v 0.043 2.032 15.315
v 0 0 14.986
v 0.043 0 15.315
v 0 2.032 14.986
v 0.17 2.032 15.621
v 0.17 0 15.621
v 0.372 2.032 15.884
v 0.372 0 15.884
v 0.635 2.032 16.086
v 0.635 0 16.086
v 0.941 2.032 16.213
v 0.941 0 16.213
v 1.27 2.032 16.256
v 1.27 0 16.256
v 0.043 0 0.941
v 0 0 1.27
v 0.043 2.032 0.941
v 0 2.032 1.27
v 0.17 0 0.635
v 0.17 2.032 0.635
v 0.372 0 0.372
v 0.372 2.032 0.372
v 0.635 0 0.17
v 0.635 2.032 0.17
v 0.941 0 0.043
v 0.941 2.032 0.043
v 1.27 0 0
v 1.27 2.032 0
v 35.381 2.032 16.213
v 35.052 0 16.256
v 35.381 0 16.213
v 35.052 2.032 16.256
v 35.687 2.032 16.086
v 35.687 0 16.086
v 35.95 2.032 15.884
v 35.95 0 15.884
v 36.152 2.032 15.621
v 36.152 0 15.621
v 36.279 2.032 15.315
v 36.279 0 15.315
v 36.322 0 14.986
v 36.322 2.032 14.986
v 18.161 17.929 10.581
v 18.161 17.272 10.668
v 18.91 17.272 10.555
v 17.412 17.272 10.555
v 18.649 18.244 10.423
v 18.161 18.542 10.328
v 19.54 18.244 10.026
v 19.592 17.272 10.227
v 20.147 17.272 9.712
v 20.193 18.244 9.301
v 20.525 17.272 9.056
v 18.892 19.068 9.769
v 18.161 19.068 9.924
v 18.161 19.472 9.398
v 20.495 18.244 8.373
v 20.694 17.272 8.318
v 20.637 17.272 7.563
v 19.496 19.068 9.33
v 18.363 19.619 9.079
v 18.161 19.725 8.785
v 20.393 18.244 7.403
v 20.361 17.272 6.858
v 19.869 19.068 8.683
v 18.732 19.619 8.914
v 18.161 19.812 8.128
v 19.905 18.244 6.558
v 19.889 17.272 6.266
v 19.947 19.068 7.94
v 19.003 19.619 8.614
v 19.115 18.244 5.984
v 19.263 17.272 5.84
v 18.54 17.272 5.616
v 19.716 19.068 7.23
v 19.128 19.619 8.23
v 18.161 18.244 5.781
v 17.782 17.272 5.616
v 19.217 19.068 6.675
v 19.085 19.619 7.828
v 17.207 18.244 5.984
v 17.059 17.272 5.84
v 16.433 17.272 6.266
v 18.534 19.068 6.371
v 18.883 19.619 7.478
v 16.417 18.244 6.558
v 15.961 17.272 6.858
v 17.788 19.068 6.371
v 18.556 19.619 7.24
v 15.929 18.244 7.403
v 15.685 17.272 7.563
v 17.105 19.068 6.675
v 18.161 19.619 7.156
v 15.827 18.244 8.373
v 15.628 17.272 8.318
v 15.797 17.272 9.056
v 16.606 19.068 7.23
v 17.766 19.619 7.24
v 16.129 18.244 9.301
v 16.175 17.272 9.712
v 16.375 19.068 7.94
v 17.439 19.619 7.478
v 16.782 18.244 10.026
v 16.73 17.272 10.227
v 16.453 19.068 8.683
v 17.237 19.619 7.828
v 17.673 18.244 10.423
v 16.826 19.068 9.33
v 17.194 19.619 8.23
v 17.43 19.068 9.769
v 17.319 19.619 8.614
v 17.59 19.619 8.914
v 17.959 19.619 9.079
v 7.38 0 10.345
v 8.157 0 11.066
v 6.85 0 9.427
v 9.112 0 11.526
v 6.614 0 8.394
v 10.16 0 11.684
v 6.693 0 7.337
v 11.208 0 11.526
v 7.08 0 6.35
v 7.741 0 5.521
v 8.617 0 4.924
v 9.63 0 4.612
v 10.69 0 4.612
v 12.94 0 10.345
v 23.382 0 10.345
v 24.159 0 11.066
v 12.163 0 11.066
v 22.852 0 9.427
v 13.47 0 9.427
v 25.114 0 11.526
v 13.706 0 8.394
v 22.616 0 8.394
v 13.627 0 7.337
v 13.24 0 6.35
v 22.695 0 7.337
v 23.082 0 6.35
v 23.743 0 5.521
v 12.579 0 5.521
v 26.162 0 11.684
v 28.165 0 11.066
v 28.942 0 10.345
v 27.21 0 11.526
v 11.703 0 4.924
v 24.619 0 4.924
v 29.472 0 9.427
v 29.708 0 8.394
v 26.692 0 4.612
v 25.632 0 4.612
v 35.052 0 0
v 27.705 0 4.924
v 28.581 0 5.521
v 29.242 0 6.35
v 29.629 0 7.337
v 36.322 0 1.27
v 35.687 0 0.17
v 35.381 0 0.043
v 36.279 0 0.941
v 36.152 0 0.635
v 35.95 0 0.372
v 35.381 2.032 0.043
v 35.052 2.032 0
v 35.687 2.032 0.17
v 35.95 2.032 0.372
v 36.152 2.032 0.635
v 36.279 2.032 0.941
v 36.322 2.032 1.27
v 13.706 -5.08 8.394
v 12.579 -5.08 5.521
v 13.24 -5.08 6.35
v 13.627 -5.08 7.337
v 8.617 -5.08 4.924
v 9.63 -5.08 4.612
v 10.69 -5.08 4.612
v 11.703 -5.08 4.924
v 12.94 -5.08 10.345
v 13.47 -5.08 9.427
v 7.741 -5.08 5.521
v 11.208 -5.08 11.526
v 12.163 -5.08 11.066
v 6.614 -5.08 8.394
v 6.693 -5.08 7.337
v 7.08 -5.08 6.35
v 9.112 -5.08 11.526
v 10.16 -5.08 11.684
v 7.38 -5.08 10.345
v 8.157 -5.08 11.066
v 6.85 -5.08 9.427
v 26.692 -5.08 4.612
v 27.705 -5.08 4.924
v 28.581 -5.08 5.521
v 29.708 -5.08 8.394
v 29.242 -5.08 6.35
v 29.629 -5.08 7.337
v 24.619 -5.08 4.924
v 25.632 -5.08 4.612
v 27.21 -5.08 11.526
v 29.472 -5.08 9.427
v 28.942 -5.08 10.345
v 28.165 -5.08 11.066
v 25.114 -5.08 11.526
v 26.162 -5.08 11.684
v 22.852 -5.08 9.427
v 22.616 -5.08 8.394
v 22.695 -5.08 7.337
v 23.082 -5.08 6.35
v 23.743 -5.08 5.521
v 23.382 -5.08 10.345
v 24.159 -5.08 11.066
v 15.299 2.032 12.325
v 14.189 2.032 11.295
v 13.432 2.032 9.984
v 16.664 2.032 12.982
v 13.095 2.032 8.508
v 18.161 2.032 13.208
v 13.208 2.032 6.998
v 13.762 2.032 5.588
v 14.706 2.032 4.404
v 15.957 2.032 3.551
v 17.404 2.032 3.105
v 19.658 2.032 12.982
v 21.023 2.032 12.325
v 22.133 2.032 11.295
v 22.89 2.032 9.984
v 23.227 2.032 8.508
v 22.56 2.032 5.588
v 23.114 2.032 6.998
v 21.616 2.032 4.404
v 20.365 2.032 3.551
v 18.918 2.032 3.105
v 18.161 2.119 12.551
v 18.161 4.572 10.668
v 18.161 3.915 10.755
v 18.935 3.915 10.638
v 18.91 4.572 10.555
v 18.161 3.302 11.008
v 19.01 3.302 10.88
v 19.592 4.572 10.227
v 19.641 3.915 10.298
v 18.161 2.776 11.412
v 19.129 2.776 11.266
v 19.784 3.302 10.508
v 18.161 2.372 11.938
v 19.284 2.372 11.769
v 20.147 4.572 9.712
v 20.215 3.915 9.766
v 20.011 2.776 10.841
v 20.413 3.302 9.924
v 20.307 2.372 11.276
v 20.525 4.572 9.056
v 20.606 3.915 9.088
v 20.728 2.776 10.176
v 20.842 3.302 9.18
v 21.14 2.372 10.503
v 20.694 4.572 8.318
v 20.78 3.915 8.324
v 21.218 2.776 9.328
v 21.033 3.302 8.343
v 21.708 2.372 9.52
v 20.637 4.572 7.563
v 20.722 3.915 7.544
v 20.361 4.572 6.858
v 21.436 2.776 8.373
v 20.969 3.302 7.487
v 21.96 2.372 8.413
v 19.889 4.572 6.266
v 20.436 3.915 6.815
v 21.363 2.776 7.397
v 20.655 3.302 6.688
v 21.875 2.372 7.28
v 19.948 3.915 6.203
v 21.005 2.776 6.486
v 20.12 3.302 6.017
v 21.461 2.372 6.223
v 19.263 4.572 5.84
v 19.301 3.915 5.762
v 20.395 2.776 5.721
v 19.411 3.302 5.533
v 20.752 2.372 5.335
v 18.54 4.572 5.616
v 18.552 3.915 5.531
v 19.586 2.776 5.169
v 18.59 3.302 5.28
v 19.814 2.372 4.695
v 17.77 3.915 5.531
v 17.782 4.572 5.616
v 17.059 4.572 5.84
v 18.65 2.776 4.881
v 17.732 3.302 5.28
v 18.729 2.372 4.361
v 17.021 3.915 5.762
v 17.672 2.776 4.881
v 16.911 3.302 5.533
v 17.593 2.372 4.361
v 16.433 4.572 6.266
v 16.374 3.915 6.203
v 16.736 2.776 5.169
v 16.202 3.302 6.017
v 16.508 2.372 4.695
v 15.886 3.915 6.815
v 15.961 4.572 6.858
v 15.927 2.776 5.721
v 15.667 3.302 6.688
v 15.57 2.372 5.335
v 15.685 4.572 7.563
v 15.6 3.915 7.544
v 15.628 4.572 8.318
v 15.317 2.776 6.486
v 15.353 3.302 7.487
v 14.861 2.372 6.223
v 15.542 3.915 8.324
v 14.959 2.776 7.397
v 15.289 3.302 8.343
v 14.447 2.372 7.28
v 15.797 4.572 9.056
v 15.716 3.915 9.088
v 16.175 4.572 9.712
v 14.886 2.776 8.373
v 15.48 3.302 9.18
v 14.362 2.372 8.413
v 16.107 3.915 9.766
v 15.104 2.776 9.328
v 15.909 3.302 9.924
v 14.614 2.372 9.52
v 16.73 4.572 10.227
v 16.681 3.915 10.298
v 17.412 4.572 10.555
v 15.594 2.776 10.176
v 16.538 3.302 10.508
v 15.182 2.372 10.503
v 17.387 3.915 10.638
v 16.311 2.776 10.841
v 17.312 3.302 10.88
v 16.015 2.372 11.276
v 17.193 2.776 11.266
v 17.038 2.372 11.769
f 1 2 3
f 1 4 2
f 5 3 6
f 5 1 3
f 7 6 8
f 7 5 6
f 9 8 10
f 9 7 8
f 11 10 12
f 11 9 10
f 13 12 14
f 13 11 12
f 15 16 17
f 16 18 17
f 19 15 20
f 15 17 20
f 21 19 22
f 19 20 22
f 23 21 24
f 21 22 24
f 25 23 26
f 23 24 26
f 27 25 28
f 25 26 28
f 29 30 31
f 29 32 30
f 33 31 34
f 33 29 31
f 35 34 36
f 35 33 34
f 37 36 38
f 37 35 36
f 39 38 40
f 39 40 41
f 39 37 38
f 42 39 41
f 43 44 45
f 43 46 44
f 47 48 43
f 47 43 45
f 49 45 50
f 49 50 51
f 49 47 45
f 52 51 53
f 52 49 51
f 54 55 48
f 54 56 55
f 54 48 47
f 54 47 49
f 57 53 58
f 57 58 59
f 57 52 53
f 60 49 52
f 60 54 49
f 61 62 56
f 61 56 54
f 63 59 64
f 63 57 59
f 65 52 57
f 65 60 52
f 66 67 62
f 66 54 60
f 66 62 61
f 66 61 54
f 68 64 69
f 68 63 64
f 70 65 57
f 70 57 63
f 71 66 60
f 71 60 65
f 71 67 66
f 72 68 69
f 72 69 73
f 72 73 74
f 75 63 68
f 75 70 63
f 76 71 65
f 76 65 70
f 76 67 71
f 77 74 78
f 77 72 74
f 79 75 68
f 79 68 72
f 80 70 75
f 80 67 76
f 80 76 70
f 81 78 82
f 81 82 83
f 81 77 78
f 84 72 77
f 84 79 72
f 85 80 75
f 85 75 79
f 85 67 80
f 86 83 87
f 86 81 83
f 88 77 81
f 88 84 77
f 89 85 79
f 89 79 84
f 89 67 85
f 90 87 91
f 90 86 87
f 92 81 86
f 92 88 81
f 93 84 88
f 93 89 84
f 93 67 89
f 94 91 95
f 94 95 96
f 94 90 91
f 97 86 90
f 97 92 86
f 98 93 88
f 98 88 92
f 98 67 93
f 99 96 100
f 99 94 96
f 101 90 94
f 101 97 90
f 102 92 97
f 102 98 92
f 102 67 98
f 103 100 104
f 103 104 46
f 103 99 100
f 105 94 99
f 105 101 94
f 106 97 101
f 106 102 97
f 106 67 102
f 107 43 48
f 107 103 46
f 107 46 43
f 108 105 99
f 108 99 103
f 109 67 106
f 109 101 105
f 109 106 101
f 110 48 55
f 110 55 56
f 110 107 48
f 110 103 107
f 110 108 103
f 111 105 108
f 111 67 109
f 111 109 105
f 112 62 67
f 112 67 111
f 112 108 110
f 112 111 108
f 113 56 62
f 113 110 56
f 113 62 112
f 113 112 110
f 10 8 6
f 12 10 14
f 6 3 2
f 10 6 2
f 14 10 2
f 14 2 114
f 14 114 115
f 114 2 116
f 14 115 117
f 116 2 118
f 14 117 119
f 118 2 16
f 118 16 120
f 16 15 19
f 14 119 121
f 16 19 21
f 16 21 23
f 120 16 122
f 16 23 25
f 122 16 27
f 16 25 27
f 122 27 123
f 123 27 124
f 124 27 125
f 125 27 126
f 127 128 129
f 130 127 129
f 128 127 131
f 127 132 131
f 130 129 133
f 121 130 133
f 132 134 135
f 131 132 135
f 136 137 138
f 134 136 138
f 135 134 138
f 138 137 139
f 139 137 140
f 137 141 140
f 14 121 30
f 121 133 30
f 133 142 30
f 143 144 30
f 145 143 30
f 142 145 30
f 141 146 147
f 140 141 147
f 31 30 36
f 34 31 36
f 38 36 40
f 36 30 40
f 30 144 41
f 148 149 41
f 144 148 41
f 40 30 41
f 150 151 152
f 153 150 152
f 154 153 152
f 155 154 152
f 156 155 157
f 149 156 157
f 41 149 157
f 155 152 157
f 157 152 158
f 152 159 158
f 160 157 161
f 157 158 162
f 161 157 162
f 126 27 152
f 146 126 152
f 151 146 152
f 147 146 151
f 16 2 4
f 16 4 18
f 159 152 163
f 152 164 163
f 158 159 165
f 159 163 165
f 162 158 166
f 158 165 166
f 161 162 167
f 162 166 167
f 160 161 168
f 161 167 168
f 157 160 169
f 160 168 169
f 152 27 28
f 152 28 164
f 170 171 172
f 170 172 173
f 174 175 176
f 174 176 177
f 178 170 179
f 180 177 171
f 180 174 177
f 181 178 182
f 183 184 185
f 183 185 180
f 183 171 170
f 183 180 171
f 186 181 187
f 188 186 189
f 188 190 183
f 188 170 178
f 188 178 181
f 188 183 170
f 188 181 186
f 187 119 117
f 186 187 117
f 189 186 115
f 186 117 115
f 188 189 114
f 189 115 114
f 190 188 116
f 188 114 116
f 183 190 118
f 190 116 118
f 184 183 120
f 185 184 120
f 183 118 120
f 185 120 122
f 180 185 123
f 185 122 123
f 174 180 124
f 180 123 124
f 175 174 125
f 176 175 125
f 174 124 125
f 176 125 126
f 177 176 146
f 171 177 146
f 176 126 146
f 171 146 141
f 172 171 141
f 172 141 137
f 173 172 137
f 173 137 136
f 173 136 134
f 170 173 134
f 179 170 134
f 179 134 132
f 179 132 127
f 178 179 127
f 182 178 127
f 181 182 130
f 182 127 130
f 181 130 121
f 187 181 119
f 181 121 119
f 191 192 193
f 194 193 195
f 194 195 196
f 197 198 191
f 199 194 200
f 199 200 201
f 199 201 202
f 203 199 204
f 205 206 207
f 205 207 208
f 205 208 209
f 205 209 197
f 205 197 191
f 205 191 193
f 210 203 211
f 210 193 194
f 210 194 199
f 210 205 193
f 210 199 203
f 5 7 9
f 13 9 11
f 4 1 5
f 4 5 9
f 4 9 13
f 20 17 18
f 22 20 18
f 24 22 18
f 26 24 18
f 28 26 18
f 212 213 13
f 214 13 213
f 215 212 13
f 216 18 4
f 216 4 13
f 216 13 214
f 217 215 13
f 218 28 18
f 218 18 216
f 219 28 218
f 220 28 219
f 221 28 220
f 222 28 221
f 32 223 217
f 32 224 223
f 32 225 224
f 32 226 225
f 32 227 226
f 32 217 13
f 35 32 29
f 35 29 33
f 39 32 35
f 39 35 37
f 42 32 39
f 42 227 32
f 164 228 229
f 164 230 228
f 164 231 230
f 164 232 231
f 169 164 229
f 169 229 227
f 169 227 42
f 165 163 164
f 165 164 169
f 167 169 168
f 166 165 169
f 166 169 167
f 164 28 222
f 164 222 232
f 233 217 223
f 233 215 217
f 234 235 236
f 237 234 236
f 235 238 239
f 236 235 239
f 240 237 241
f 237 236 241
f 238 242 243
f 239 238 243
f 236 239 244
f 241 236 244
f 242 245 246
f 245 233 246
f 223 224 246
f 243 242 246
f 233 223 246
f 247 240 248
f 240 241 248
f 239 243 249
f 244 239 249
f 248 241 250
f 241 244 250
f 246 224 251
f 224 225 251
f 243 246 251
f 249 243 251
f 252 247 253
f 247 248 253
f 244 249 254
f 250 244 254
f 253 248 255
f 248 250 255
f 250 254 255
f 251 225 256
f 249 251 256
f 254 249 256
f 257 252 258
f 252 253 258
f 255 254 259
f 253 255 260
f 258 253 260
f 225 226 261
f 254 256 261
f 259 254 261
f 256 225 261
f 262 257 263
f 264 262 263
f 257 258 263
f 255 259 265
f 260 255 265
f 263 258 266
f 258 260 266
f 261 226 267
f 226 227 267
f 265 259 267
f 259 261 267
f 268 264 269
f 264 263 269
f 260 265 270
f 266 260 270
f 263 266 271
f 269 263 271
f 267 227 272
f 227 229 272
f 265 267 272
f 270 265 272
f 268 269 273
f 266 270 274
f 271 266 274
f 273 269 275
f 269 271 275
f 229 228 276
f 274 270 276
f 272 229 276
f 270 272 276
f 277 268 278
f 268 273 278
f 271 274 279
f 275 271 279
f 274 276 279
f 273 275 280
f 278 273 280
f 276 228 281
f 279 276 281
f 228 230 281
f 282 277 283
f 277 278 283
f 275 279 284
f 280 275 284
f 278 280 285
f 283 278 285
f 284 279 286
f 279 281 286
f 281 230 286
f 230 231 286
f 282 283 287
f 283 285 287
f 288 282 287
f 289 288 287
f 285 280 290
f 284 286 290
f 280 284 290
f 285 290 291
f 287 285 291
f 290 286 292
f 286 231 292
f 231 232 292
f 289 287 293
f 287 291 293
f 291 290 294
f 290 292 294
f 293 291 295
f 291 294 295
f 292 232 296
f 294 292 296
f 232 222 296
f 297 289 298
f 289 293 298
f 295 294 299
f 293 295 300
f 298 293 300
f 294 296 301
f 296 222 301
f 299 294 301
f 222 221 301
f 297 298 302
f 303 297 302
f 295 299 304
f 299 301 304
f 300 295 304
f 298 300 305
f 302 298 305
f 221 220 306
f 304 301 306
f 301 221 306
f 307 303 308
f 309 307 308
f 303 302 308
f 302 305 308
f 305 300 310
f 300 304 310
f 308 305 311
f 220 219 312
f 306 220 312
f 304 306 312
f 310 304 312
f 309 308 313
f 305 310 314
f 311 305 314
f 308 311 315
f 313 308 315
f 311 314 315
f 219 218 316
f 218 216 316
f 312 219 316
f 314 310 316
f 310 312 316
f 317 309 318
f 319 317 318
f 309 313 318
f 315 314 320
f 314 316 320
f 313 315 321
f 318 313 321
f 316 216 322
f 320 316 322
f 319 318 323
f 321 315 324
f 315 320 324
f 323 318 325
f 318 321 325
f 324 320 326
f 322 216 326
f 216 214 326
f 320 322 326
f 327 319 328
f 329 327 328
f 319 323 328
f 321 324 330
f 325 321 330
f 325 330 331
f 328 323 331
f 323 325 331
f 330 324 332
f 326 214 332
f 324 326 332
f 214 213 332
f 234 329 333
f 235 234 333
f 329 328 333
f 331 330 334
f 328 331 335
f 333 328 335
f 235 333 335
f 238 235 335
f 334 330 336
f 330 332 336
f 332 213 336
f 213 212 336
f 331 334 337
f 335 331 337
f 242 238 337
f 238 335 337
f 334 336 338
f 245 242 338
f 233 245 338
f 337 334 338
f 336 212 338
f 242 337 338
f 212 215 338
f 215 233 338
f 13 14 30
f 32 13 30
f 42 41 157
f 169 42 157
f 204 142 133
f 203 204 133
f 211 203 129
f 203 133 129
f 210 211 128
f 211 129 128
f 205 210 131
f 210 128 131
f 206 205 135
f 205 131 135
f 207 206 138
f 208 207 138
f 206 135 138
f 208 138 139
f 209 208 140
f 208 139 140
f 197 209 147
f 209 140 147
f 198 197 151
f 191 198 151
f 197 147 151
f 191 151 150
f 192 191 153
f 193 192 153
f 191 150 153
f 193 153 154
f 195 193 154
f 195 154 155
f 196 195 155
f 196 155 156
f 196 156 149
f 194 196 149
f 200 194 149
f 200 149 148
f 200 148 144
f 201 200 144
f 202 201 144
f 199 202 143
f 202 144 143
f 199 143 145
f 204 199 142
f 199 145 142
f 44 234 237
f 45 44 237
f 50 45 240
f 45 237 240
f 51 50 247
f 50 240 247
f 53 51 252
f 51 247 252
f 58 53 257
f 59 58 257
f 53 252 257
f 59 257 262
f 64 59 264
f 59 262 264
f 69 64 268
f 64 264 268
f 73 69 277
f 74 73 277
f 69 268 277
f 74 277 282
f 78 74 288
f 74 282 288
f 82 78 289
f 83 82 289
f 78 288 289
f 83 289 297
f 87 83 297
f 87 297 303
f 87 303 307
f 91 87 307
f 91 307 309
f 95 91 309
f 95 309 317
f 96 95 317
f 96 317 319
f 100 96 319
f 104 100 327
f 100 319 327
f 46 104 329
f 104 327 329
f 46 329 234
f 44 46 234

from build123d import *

# Parameters (mm, degrees)
SKETCH1_W           = 36.322
SKETCH1_H           = 16.256
BOSS_EXTRUDE1_DEPTH = 2.032
SKETCH2_R           = 2.54
BOSS_EXTRUDE2_DEPTH = 17.78
FILLET1_R           = 2.54
FILLET2_R           = 2.54
FILLET3_R           = 1.27
SKETCH3_R           = 3.556
BOSS_EXTRUDE3_DEPTH = 5.08


with BuildPart() as part:
    # Sketch1 → Boss-Extrude1 (new body)
    with BuildSketch(Plane(origin=(0, 0, 0), x_dir=(1, 0, 0), z_dir=(0, 1, 0))):
        with Locations((18.161, -8.128)):
            Rectangle(SKETCH1_W, SKETCH1_H)
    extrude(amount=BOSS_EXTRUDE1_DEPTH)

    # Sketch2 → Boss-Extrude2 (add)
    with BuildSketch(Plane(origin=(0, 2.032, 0), x_dir=(1, 0, 0), z_dir=(0, 1, 0))):
        with Locations(Location((18.161, -8.128, 0), (0, 0, 270))):
            Circle(SKETCH2_R)
    extrude(amount=BOSS_EXTRUDE2_DEPTH)

    # Fillet1
    fillet1_edges = [part.edges().sort_by_distance(p)[0] for p in [
        (18.161, 19.812, 5.588),
    ]]
    fillet(fillet1_edges, radius=FILLET1_R)

    # Fillet2
    fillet2_edges = [part.edges().sort_by_distance(p)[0] for p in [
        (18.161, 2.032, 5.588),
    ]]
    fillet(fillet2_edges, radius=FILLET2_R)

    # Fillet3
    fillet3_edges = [part.edges().sort_by_distance(p)[0] for p in [
        (0, 1.016, 0),
        (36.322, 1.016, 0),
        (36.322, 1.016, 16.256),
        (0, 1.016, 16.256),
    ]]
    fillet(fillet3_edges, radius=FILLET3_R)

    # Sketch3 → Boss-Extrude3 (add)
    with BuildSketch(Plane.XZ):
        with Locations(Location((10.16, 8.128, 0), (0, 0, 90))):
            Circle(SKETCH3_R)
        with Locations(Location((26.162, 8.128, 0), (0, 0, 90))):
            Circle(SKETCH3_R)
    extrude(amount=BOSS_EXTRUDE3_DEPTH)


solid = part.part
